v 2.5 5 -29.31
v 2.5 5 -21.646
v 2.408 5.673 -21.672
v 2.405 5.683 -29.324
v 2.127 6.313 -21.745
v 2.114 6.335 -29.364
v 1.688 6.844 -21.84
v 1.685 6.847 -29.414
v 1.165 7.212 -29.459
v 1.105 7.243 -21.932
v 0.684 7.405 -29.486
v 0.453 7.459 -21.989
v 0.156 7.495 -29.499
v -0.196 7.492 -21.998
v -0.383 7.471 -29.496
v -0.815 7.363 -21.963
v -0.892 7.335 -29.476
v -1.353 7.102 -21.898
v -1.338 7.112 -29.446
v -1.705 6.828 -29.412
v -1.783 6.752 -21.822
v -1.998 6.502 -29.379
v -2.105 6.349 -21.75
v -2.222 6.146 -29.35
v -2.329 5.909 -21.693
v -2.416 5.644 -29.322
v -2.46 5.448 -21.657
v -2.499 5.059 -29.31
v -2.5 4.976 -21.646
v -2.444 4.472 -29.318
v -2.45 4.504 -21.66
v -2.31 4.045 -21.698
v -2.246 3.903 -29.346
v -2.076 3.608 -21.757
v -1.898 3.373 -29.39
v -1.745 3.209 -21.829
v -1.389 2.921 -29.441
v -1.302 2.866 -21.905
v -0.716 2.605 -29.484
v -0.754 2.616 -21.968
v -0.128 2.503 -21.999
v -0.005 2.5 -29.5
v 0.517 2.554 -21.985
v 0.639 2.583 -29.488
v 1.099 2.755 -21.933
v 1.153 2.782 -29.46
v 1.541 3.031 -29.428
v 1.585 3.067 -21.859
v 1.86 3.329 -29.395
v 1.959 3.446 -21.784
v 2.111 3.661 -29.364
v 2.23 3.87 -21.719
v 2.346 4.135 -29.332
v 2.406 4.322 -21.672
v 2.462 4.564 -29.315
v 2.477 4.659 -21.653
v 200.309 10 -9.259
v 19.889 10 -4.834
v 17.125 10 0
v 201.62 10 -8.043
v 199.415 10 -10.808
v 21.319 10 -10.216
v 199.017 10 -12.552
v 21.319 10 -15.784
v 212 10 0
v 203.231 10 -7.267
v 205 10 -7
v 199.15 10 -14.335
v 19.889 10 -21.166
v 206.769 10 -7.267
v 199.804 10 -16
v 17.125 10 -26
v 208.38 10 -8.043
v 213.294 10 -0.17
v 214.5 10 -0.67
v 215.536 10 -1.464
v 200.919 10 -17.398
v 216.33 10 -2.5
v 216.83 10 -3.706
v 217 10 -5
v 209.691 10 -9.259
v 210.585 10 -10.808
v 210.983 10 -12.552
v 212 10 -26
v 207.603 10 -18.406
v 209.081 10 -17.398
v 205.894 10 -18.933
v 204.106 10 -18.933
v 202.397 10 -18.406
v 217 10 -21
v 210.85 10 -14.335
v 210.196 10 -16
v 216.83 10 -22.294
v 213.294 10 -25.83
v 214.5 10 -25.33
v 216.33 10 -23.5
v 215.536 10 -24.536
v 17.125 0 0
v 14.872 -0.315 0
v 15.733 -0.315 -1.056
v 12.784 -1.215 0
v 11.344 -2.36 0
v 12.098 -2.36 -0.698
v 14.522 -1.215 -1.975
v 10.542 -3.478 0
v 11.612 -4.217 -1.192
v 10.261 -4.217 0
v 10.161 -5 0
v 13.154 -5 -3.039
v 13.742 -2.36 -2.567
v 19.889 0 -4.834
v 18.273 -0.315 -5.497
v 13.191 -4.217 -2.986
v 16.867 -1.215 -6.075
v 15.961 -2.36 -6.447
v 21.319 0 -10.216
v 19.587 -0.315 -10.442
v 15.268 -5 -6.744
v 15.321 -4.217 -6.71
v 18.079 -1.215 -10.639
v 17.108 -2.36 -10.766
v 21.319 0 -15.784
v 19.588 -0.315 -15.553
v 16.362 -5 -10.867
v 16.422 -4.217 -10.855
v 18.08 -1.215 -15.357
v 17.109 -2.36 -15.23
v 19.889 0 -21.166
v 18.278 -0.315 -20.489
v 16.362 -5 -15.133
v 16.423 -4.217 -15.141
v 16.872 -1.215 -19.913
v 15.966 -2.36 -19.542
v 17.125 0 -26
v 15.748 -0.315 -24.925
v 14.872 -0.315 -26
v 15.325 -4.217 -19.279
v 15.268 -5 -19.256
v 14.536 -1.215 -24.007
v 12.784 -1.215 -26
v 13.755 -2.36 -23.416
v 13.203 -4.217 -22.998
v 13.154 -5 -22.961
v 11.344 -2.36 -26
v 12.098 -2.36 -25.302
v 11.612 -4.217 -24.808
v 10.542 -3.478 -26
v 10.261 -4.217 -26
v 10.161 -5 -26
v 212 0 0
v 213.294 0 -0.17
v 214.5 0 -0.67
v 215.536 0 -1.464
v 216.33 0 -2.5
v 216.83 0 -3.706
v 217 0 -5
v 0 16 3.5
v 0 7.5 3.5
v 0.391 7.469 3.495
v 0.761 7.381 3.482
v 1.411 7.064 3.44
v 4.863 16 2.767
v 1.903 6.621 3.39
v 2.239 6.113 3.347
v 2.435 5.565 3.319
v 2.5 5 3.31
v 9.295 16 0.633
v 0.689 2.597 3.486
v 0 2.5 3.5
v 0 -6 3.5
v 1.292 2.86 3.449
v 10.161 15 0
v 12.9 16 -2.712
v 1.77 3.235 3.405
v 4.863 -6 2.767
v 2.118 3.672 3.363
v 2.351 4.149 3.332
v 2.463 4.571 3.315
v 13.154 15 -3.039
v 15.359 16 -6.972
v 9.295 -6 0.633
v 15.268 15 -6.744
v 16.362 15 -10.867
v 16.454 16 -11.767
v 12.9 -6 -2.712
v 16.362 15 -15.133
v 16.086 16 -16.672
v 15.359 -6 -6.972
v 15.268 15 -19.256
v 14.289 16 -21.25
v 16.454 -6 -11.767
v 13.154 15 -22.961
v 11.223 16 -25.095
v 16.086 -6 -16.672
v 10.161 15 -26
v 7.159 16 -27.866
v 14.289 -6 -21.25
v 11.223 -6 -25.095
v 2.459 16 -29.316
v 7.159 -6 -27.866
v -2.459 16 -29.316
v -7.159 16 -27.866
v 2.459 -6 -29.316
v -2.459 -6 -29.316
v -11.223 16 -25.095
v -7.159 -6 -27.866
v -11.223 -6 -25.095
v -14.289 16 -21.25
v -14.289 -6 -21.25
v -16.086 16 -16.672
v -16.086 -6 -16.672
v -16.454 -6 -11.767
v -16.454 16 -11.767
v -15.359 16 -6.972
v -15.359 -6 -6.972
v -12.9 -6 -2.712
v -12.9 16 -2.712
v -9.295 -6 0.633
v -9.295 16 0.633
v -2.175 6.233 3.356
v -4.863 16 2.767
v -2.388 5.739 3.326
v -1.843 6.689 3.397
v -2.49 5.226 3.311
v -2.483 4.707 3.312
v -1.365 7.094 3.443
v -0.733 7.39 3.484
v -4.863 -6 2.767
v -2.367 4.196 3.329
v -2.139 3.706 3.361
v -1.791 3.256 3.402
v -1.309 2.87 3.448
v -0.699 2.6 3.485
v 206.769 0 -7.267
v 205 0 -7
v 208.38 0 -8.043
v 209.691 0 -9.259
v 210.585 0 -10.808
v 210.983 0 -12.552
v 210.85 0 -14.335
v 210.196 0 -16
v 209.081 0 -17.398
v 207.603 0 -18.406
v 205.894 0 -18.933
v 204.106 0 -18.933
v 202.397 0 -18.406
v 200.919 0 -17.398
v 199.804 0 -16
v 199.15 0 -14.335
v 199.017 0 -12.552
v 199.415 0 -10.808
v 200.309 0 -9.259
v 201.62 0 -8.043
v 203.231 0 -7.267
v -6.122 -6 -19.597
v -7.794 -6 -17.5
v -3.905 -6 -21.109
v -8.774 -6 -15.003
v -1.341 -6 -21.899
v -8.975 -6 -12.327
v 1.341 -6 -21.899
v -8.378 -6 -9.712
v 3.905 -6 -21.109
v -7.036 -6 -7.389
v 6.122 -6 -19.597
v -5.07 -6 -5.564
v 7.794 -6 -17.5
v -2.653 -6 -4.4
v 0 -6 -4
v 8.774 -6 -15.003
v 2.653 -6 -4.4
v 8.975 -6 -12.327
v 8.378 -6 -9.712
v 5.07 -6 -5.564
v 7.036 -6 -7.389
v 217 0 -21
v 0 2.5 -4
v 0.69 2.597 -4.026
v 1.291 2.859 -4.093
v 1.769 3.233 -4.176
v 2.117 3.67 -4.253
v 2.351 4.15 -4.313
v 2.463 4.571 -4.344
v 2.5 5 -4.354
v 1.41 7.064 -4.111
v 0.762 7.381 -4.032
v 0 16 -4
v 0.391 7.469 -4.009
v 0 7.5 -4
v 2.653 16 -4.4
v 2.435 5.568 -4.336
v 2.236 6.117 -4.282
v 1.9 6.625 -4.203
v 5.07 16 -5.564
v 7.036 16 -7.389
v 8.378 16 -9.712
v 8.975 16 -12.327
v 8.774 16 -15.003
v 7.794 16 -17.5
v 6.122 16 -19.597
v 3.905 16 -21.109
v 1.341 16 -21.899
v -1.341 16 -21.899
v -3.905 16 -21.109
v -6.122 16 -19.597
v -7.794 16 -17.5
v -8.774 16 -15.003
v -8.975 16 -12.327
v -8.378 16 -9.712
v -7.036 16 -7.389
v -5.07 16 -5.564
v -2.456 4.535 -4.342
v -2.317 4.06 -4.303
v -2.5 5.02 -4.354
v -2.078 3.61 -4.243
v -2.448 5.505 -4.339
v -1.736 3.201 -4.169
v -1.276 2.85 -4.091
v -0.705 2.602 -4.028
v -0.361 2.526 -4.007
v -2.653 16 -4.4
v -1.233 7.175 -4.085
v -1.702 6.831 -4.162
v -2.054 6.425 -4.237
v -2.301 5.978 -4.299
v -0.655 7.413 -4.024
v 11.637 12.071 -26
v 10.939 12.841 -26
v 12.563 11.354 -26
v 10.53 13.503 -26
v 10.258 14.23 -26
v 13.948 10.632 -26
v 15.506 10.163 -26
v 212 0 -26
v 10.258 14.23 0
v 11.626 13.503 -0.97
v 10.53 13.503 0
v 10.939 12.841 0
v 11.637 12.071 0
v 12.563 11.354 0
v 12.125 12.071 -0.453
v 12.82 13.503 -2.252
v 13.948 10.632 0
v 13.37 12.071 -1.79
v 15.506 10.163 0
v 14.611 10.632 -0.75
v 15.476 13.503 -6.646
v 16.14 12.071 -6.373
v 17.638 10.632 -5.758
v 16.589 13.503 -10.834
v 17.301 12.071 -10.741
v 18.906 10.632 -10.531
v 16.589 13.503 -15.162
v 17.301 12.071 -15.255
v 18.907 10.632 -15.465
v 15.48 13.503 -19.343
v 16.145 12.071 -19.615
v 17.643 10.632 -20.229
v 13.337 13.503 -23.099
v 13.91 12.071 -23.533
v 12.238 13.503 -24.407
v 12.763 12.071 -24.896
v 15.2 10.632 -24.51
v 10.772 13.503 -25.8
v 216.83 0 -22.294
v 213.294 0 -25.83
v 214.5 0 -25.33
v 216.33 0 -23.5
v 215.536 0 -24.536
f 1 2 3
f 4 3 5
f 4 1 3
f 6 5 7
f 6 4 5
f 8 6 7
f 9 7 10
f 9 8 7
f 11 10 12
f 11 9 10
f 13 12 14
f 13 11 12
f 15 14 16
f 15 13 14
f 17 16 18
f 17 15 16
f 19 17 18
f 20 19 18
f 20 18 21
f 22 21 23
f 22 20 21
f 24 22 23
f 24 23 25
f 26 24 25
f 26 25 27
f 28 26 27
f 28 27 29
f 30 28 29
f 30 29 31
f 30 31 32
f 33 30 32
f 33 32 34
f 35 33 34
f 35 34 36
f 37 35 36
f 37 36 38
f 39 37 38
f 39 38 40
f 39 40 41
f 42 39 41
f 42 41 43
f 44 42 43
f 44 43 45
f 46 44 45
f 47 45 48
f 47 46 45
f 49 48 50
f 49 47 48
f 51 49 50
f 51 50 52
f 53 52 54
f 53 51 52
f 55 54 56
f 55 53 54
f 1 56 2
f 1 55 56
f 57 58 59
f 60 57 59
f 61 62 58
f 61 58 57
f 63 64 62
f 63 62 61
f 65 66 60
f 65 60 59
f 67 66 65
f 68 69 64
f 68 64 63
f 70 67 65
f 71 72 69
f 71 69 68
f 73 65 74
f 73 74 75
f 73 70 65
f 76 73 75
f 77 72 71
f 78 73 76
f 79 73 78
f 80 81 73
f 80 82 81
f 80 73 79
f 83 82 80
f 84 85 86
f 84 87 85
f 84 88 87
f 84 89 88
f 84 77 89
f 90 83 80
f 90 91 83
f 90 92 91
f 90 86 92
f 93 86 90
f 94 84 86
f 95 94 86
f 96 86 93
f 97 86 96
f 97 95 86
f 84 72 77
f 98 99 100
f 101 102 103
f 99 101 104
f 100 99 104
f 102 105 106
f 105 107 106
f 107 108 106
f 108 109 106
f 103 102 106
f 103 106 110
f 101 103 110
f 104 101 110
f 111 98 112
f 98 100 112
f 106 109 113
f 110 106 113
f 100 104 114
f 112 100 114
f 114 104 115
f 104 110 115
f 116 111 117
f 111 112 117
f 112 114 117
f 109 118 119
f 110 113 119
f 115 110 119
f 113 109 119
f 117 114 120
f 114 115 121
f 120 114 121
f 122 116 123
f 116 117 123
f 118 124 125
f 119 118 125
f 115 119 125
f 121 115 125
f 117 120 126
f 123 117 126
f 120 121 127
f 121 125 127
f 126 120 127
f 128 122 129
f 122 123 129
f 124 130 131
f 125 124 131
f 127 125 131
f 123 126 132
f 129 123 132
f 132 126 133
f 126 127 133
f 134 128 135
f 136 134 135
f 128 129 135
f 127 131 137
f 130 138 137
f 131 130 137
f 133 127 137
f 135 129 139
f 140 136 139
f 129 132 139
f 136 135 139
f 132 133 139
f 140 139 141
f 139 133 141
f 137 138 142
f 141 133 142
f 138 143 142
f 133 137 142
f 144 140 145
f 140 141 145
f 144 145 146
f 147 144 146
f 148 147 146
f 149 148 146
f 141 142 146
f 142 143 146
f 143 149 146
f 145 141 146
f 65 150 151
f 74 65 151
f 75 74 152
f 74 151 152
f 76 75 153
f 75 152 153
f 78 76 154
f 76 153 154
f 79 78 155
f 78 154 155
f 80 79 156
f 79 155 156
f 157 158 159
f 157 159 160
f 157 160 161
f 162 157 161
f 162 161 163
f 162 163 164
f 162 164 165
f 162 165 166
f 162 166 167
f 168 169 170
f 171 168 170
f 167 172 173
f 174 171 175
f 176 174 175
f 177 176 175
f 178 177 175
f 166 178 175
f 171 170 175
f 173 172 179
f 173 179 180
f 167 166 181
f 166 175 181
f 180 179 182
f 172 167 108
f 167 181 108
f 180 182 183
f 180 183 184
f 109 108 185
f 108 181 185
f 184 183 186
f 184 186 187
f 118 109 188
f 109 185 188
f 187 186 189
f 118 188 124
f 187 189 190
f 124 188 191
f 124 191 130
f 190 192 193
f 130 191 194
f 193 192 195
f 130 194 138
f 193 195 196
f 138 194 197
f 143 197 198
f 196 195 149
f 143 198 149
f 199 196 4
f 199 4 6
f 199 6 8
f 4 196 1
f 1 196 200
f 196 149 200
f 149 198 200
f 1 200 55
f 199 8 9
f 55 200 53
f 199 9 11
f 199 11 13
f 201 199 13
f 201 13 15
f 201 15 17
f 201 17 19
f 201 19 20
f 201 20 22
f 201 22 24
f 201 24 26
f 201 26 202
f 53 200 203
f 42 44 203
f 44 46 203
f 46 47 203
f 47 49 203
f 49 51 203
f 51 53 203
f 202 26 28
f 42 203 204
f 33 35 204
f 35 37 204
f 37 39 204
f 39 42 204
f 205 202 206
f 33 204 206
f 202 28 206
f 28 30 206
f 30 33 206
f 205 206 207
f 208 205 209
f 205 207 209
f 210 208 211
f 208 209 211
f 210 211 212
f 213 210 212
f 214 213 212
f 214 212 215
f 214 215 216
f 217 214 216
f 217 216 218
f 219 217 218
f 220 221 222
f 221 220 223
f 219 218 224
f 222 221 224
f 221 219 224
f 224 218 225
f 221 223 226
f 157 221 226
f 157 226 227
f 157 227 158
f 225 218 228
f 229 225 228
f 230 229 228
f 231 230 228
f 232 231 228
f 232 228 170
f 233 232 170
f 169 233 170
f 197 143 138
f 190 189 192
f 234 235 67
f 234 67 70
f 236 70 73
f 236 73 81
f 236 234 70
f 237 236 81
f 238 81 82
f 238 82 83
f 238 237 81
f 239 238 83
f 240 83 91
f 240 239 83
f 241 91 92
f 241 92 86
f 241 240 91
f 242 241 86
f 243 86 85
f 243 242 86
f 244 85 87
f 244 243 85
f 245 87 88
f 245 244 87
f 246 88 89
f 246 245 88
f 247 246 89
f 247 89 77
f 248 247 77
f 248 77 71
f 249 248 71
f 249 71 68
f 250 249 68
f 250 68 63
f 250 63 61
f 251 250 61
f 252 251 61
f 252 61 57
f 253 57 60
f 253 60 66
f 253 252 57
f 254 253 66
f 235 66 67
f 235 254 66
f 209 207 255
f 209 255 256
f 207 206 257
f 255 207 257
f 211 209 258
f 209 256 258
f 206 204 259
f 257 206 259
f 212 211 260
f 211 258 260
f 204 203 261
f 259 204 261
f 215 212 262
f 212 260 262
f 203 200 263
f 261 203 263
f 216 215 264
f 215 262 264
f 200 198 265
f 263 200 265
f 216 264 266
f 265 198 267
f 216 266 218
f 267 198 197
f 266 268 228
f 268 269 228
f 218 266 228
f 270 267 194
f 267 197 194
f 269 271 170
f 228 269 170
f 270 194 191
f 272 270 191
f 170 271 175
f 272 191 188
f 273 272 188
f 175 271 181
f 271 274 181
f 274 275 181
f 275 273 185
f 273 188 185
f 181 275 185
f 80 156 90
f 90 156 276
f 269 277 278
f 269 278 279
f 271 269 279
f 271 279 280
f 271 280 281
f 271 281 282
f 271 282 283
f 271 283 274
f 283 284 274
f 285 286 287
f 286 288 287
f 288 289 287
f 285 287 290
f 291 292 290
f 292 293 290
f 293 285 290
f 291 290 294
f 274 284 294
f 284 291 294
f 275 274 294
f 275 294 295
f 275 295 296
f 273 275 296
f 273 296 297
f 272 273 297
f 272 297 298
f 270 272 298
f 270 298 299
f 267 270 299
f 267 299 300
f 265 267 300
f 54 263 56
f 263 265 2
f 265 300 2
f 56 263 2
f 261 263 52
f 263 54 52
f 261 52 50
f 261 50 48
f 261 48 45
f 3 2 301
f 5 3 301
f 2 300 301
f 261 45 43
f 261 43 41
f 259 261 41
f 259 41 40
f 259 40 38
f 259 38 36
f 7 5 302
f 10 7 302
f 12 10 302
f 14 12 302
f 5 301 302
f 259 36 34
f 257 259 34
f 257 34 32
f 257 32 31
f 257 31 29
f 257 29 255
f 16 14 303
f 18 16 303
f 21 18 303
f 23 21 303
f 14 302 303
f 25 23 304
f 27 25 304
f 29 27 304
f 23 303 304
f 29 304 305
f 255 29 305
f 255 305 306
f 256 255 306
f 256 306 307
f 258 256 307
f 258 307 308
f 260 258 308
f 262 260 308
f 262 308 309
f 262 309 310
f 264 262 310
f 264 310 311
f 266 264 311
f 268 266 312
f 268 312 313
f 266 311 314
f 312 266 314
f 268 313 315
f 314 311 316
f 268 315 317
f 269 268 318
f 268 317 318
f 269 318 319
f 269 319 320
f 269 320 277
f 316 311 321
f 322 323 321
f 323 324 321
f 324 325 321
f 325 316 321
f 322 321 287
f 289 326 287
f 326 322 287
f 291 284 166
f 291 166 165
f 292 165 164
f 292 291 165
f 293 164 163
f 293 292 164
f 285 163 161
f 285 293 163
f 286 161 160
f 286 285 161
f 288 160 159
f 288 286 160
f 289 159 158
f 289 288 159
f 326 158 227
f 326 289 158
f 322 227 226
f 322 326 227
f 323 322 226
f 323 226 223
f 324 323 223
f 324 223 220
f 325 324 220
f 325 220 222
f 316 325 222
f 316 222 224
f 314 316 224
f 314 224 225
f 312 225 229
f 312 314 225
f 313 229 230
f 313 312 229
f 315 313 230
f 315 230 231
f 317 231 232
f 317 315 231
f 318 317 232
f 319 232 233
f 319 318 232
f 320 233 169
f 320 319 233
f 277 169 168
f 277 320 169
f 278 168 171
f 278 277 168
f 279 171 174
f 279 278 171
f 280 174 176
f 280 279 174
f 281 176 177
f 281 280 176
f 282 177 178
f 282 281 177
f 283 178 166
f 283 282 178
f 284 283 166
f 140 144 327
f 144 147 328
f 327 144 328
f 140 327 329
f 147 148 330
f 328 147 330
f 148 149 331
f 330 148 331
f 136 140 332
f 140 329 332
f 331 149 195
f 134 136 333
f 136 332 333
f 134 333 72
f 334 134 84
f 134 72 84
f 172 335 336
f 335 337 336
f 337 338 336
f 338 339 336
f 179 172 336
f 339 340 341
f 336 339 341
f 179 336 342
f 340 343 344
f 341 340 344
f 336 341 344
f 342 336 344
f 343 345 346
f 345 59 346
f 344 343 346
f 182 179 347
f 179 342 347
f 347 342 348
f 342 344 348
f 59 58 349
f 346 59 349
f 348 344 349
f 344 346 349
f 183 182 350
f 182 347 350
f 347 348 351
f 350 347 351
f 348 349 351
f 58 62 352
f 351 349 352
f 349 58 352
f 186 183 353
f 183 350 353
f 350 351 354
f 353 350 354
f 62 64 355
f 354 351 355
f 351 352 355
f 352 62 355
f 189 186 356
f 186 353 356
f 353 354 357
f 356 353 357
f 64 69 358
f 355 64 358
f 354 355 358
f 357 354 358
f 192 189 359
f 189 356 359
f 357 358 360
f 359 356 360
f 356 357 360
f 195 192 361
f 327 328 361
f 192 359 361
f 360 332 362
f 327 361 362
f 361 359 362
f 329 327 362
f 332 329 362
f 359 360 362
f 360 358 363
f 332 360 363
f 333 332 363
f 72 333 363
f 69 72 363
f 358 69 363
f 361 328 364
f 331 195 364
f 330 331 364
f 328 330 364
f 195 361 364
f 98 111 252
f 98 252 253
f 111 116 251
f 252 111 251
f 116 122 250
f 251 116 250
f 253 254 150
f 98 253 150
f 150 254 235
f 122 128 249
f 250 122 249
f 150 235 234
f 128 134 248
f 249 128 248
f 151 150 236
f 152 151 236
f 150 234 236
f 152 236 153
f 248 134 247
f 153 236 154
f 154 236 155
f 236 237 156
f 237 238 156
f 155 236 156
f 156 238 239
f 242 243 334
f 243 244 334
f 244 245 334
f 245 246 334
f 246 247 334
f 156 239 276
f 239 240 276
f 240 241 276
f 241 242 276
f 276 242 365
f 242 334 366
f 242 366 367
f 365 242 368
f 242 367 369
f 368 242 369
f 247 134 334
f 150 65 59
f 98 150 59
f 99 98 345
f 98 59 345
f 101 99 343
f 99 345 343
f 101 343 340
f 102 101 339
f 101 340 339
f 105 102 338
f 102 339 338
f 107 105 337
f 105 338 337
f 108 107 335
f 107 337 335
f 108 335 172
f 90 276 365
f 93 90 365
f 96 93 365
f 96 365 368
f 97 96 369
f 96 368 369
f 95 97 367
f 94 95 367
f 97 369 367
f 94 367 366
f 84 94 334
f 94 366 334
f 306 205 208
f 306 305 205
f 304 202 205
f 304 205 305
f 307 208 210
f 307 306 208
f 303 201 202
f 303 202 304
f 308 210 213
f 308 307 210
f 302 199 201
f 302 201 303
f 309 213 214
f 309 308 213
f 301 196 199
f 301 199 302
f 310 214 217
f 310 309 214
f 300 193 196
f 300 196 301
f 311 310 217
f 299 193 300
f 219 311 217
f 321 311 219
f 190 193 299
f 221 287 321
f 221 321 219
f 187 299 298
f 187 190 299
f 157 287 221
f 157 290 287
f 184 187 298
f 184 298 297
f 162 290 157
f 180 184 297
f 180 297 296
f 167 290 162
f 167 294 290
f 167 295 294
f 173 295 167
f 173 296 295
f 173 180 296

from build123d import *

# Parameters (mm, degrees)
SZKIC1_R                         = 6
DODANIE_WYCI_GNI_CIE1_DEPTH      = 10
DODANIE_WYCI_GNI_CIE2_DEPTH      = 6
DODANIE_WYCI_GNI_CIE2_DEPTH_BACK = 16
SZKIC2_R                         = 16.5
SZKIC3_R                         = 9
WYTNIJ_WYCI_GNI_CIE1_DEPTH       = 221.098273505
WYTNIJ_WYCI_GNI_CIE2_DEPTH       = 220.579712178
WYTNIJ_WYCI_GNI_CIE2_DEPTH_BACK  = 220.579712178
SZKIC4_R                         = 2.5
ZAOKR_GLENIE1_R                  = 5


with BuildPart() as part:
    # Szkic1 → Dodanie-wyciągnięcie1 (new body)
    with BuildSketch(Plane(origin=(0, 0, 0), x_dir=(1, 0, 0), z_dir=(0, 1, 0))):
        with BuildLine():
            Line((0, 0), (212, 0))
            ThreePointArc((212, 0), (215.535533906, 1.464466094), (217, 5))
            Line((217, 5), (217, 21))
            ThreePointArc((217, 21), (215.535533906, 24.535533906), (212, 26))
            Line((212, 26), (0, 26))
            Line((0, 26), (0, 0))
        make_face()
        with Locations(Location((205, 13, 0), (0, 0, 270))):
            Circle(SZKIC1_R, mode=Mode.SUBTRACT)
    extrude(amount=DODANIE_WYCI_GNI_CIE1_DEPTH)

    # Szkic2 → Dodanie-wyciągnięcie2 (add, two sides: drawn at the far end of the back side and taken through both)
    with BuildSketch(Plane(origin=(0, 10, 0), x_dir=(1, 0, 0), z_dir=(0, 1, 0)).offset(-DODANIE_WYCI_GNI_CIE2_DEPTH_BACK)):
        with Locations(Location((0, 13, 0), (0, 0, 270))):
            Circle(SZKIC2_R)
    extrude(amount=DODANIE_WYCI_GNI_CIE2_DEPTH + DODANIE_WYCI_GNI_CIE2_DEPTH_BACK)

    # Szkic3 → Wytnij-wyciągnięcie1 (cut, through all)
    with BuildSketch(Plane(origin=(0, 16, 0), x_dir=(1, 0, 0), z_dir=(0, 1, 0))):
        with Locations(Location((0, 13, 0), (0, 0, 270))):
            Circle(SZKIC3_R)
    extrude(amount=-WYTNIJ_WYCI_GNI_CIE1_DEPTH, mode=Mode.SUBTRACT)

    # Szkic4 → Wytnij-wyciągnięcie2 (cut, two sides: drawn at the far end of the back side and taken through both)
    with BuildSketch(Plane.XY.offset(-WYTNIJ_WYCI_GNI_CIE2_DEPTH_BACK)):
        with Locations((0, 5)):
            Circle(SZKIC4_R)
    extrude(amount=WYTNIJ_WYCI_GNI_CIE2_DEPTH + WYTNIJ_WYCI_GNI_CIE2_DEPTH_BACK, mode=Mode.SUBTRACT)

    # Zaokrąglenie1
    # the kernel refuses this fillet: 5 mm, written as the material it adds along each edge
    with BuildSketch(Plane(origin=(0, 0, -13), x_dir=(-0.09440175808825453, 0, 0.9955341822709287), z_dir=(-0.9955341822709287, 0, -0.09440175808825453))) as zaokr_glenie1_piece_1_section:
        with BuildLine():
            CenterArc((16.5 + ZAOKR_GLENIE1_R, -ZAOKR_GLENIE1_R), ZAOKR_GLENIE1_R, 90, 90)
            Line((16.5, -ZAOKR_GLENIE1_R), (16.5, 0))
            Line((16.5, 0), (16.5 + ZAOKR_GLENIE1_R, 0))
        make_face()
    zaokr_glenie1_piece_1 = revolve(axis=Axis((0, 0, -13), (0, 1, 0)), revolution_arc=190.833776665, mode=Mode.PRIVATE)
    zaokr_glenie1_piece_1 = split(zaokr_glenie1_piece_1, bisect_by=Plane(origin=(17.924039728, -1.424039728, -26), z_dir=(0, 0, 1)), keep=Keep.TOP, mode=Mode.PRIVATE)
    zaokr_glenie1_piece_1 = split(zaokr_glenie1_piece_1, bisect_by=Plane(origin=(17.924039728, -1.424039728, 0), z_dir=(0, 0, -1)), keep=Keep.TOP, mode=Mode.PRIVATE)
    with BuildSketch(Plane(origin=(0, 10, -13), x_dir=(-0.09440175808827972, 0, 0.9955341822709262), z_dir=(-0.9955341822709262, 0, -0.09440175808827972))) as zaokr_glenie1_piece_2_section:
        with BuildLine():
            CenterArc((16.5 + ZAOKR_GLENIE1_R, ZAOKR_GLENIE1_R), ZAOKR_GLENIE1_R, 180, 90)
            Line((16.5, ZAOKR_GLENIE1_R), (16.5, 0))
            Line((16.5, 0), (16.5 + ZAOKR_GLENIE1_R, 0))
        make_face()
    zaokr_glenie1_piece_2 = revolve(axis=Axis((0, 10, -13), (0, 1, 0)), revolution_arc=190.833776665, mode=Mode.PRIVATE)
    zaokr_glenie1_piece_2 = split(zaokr_glenie1_piece_2, bisect_by=Plane(origin=(17.924039728, 11.424039728, -26), z_dir=(0, 0, 1)), keep=Keep.TOP, mode=Mode.PRIVATE)
    zaokr_glenie1_piece_2 = split(zaokr_glenie1_piece_2, bisect_by=Plane(origin=(17.924039728, 11.424039728, 0), z_dir=(0, 0, -1)), keep=Keep.TOP, mode=Mode.PRIVATE)
    add([zaokr_glenie1_piece_1, zaokr_glenie1_piece_2])


solid = part.part
